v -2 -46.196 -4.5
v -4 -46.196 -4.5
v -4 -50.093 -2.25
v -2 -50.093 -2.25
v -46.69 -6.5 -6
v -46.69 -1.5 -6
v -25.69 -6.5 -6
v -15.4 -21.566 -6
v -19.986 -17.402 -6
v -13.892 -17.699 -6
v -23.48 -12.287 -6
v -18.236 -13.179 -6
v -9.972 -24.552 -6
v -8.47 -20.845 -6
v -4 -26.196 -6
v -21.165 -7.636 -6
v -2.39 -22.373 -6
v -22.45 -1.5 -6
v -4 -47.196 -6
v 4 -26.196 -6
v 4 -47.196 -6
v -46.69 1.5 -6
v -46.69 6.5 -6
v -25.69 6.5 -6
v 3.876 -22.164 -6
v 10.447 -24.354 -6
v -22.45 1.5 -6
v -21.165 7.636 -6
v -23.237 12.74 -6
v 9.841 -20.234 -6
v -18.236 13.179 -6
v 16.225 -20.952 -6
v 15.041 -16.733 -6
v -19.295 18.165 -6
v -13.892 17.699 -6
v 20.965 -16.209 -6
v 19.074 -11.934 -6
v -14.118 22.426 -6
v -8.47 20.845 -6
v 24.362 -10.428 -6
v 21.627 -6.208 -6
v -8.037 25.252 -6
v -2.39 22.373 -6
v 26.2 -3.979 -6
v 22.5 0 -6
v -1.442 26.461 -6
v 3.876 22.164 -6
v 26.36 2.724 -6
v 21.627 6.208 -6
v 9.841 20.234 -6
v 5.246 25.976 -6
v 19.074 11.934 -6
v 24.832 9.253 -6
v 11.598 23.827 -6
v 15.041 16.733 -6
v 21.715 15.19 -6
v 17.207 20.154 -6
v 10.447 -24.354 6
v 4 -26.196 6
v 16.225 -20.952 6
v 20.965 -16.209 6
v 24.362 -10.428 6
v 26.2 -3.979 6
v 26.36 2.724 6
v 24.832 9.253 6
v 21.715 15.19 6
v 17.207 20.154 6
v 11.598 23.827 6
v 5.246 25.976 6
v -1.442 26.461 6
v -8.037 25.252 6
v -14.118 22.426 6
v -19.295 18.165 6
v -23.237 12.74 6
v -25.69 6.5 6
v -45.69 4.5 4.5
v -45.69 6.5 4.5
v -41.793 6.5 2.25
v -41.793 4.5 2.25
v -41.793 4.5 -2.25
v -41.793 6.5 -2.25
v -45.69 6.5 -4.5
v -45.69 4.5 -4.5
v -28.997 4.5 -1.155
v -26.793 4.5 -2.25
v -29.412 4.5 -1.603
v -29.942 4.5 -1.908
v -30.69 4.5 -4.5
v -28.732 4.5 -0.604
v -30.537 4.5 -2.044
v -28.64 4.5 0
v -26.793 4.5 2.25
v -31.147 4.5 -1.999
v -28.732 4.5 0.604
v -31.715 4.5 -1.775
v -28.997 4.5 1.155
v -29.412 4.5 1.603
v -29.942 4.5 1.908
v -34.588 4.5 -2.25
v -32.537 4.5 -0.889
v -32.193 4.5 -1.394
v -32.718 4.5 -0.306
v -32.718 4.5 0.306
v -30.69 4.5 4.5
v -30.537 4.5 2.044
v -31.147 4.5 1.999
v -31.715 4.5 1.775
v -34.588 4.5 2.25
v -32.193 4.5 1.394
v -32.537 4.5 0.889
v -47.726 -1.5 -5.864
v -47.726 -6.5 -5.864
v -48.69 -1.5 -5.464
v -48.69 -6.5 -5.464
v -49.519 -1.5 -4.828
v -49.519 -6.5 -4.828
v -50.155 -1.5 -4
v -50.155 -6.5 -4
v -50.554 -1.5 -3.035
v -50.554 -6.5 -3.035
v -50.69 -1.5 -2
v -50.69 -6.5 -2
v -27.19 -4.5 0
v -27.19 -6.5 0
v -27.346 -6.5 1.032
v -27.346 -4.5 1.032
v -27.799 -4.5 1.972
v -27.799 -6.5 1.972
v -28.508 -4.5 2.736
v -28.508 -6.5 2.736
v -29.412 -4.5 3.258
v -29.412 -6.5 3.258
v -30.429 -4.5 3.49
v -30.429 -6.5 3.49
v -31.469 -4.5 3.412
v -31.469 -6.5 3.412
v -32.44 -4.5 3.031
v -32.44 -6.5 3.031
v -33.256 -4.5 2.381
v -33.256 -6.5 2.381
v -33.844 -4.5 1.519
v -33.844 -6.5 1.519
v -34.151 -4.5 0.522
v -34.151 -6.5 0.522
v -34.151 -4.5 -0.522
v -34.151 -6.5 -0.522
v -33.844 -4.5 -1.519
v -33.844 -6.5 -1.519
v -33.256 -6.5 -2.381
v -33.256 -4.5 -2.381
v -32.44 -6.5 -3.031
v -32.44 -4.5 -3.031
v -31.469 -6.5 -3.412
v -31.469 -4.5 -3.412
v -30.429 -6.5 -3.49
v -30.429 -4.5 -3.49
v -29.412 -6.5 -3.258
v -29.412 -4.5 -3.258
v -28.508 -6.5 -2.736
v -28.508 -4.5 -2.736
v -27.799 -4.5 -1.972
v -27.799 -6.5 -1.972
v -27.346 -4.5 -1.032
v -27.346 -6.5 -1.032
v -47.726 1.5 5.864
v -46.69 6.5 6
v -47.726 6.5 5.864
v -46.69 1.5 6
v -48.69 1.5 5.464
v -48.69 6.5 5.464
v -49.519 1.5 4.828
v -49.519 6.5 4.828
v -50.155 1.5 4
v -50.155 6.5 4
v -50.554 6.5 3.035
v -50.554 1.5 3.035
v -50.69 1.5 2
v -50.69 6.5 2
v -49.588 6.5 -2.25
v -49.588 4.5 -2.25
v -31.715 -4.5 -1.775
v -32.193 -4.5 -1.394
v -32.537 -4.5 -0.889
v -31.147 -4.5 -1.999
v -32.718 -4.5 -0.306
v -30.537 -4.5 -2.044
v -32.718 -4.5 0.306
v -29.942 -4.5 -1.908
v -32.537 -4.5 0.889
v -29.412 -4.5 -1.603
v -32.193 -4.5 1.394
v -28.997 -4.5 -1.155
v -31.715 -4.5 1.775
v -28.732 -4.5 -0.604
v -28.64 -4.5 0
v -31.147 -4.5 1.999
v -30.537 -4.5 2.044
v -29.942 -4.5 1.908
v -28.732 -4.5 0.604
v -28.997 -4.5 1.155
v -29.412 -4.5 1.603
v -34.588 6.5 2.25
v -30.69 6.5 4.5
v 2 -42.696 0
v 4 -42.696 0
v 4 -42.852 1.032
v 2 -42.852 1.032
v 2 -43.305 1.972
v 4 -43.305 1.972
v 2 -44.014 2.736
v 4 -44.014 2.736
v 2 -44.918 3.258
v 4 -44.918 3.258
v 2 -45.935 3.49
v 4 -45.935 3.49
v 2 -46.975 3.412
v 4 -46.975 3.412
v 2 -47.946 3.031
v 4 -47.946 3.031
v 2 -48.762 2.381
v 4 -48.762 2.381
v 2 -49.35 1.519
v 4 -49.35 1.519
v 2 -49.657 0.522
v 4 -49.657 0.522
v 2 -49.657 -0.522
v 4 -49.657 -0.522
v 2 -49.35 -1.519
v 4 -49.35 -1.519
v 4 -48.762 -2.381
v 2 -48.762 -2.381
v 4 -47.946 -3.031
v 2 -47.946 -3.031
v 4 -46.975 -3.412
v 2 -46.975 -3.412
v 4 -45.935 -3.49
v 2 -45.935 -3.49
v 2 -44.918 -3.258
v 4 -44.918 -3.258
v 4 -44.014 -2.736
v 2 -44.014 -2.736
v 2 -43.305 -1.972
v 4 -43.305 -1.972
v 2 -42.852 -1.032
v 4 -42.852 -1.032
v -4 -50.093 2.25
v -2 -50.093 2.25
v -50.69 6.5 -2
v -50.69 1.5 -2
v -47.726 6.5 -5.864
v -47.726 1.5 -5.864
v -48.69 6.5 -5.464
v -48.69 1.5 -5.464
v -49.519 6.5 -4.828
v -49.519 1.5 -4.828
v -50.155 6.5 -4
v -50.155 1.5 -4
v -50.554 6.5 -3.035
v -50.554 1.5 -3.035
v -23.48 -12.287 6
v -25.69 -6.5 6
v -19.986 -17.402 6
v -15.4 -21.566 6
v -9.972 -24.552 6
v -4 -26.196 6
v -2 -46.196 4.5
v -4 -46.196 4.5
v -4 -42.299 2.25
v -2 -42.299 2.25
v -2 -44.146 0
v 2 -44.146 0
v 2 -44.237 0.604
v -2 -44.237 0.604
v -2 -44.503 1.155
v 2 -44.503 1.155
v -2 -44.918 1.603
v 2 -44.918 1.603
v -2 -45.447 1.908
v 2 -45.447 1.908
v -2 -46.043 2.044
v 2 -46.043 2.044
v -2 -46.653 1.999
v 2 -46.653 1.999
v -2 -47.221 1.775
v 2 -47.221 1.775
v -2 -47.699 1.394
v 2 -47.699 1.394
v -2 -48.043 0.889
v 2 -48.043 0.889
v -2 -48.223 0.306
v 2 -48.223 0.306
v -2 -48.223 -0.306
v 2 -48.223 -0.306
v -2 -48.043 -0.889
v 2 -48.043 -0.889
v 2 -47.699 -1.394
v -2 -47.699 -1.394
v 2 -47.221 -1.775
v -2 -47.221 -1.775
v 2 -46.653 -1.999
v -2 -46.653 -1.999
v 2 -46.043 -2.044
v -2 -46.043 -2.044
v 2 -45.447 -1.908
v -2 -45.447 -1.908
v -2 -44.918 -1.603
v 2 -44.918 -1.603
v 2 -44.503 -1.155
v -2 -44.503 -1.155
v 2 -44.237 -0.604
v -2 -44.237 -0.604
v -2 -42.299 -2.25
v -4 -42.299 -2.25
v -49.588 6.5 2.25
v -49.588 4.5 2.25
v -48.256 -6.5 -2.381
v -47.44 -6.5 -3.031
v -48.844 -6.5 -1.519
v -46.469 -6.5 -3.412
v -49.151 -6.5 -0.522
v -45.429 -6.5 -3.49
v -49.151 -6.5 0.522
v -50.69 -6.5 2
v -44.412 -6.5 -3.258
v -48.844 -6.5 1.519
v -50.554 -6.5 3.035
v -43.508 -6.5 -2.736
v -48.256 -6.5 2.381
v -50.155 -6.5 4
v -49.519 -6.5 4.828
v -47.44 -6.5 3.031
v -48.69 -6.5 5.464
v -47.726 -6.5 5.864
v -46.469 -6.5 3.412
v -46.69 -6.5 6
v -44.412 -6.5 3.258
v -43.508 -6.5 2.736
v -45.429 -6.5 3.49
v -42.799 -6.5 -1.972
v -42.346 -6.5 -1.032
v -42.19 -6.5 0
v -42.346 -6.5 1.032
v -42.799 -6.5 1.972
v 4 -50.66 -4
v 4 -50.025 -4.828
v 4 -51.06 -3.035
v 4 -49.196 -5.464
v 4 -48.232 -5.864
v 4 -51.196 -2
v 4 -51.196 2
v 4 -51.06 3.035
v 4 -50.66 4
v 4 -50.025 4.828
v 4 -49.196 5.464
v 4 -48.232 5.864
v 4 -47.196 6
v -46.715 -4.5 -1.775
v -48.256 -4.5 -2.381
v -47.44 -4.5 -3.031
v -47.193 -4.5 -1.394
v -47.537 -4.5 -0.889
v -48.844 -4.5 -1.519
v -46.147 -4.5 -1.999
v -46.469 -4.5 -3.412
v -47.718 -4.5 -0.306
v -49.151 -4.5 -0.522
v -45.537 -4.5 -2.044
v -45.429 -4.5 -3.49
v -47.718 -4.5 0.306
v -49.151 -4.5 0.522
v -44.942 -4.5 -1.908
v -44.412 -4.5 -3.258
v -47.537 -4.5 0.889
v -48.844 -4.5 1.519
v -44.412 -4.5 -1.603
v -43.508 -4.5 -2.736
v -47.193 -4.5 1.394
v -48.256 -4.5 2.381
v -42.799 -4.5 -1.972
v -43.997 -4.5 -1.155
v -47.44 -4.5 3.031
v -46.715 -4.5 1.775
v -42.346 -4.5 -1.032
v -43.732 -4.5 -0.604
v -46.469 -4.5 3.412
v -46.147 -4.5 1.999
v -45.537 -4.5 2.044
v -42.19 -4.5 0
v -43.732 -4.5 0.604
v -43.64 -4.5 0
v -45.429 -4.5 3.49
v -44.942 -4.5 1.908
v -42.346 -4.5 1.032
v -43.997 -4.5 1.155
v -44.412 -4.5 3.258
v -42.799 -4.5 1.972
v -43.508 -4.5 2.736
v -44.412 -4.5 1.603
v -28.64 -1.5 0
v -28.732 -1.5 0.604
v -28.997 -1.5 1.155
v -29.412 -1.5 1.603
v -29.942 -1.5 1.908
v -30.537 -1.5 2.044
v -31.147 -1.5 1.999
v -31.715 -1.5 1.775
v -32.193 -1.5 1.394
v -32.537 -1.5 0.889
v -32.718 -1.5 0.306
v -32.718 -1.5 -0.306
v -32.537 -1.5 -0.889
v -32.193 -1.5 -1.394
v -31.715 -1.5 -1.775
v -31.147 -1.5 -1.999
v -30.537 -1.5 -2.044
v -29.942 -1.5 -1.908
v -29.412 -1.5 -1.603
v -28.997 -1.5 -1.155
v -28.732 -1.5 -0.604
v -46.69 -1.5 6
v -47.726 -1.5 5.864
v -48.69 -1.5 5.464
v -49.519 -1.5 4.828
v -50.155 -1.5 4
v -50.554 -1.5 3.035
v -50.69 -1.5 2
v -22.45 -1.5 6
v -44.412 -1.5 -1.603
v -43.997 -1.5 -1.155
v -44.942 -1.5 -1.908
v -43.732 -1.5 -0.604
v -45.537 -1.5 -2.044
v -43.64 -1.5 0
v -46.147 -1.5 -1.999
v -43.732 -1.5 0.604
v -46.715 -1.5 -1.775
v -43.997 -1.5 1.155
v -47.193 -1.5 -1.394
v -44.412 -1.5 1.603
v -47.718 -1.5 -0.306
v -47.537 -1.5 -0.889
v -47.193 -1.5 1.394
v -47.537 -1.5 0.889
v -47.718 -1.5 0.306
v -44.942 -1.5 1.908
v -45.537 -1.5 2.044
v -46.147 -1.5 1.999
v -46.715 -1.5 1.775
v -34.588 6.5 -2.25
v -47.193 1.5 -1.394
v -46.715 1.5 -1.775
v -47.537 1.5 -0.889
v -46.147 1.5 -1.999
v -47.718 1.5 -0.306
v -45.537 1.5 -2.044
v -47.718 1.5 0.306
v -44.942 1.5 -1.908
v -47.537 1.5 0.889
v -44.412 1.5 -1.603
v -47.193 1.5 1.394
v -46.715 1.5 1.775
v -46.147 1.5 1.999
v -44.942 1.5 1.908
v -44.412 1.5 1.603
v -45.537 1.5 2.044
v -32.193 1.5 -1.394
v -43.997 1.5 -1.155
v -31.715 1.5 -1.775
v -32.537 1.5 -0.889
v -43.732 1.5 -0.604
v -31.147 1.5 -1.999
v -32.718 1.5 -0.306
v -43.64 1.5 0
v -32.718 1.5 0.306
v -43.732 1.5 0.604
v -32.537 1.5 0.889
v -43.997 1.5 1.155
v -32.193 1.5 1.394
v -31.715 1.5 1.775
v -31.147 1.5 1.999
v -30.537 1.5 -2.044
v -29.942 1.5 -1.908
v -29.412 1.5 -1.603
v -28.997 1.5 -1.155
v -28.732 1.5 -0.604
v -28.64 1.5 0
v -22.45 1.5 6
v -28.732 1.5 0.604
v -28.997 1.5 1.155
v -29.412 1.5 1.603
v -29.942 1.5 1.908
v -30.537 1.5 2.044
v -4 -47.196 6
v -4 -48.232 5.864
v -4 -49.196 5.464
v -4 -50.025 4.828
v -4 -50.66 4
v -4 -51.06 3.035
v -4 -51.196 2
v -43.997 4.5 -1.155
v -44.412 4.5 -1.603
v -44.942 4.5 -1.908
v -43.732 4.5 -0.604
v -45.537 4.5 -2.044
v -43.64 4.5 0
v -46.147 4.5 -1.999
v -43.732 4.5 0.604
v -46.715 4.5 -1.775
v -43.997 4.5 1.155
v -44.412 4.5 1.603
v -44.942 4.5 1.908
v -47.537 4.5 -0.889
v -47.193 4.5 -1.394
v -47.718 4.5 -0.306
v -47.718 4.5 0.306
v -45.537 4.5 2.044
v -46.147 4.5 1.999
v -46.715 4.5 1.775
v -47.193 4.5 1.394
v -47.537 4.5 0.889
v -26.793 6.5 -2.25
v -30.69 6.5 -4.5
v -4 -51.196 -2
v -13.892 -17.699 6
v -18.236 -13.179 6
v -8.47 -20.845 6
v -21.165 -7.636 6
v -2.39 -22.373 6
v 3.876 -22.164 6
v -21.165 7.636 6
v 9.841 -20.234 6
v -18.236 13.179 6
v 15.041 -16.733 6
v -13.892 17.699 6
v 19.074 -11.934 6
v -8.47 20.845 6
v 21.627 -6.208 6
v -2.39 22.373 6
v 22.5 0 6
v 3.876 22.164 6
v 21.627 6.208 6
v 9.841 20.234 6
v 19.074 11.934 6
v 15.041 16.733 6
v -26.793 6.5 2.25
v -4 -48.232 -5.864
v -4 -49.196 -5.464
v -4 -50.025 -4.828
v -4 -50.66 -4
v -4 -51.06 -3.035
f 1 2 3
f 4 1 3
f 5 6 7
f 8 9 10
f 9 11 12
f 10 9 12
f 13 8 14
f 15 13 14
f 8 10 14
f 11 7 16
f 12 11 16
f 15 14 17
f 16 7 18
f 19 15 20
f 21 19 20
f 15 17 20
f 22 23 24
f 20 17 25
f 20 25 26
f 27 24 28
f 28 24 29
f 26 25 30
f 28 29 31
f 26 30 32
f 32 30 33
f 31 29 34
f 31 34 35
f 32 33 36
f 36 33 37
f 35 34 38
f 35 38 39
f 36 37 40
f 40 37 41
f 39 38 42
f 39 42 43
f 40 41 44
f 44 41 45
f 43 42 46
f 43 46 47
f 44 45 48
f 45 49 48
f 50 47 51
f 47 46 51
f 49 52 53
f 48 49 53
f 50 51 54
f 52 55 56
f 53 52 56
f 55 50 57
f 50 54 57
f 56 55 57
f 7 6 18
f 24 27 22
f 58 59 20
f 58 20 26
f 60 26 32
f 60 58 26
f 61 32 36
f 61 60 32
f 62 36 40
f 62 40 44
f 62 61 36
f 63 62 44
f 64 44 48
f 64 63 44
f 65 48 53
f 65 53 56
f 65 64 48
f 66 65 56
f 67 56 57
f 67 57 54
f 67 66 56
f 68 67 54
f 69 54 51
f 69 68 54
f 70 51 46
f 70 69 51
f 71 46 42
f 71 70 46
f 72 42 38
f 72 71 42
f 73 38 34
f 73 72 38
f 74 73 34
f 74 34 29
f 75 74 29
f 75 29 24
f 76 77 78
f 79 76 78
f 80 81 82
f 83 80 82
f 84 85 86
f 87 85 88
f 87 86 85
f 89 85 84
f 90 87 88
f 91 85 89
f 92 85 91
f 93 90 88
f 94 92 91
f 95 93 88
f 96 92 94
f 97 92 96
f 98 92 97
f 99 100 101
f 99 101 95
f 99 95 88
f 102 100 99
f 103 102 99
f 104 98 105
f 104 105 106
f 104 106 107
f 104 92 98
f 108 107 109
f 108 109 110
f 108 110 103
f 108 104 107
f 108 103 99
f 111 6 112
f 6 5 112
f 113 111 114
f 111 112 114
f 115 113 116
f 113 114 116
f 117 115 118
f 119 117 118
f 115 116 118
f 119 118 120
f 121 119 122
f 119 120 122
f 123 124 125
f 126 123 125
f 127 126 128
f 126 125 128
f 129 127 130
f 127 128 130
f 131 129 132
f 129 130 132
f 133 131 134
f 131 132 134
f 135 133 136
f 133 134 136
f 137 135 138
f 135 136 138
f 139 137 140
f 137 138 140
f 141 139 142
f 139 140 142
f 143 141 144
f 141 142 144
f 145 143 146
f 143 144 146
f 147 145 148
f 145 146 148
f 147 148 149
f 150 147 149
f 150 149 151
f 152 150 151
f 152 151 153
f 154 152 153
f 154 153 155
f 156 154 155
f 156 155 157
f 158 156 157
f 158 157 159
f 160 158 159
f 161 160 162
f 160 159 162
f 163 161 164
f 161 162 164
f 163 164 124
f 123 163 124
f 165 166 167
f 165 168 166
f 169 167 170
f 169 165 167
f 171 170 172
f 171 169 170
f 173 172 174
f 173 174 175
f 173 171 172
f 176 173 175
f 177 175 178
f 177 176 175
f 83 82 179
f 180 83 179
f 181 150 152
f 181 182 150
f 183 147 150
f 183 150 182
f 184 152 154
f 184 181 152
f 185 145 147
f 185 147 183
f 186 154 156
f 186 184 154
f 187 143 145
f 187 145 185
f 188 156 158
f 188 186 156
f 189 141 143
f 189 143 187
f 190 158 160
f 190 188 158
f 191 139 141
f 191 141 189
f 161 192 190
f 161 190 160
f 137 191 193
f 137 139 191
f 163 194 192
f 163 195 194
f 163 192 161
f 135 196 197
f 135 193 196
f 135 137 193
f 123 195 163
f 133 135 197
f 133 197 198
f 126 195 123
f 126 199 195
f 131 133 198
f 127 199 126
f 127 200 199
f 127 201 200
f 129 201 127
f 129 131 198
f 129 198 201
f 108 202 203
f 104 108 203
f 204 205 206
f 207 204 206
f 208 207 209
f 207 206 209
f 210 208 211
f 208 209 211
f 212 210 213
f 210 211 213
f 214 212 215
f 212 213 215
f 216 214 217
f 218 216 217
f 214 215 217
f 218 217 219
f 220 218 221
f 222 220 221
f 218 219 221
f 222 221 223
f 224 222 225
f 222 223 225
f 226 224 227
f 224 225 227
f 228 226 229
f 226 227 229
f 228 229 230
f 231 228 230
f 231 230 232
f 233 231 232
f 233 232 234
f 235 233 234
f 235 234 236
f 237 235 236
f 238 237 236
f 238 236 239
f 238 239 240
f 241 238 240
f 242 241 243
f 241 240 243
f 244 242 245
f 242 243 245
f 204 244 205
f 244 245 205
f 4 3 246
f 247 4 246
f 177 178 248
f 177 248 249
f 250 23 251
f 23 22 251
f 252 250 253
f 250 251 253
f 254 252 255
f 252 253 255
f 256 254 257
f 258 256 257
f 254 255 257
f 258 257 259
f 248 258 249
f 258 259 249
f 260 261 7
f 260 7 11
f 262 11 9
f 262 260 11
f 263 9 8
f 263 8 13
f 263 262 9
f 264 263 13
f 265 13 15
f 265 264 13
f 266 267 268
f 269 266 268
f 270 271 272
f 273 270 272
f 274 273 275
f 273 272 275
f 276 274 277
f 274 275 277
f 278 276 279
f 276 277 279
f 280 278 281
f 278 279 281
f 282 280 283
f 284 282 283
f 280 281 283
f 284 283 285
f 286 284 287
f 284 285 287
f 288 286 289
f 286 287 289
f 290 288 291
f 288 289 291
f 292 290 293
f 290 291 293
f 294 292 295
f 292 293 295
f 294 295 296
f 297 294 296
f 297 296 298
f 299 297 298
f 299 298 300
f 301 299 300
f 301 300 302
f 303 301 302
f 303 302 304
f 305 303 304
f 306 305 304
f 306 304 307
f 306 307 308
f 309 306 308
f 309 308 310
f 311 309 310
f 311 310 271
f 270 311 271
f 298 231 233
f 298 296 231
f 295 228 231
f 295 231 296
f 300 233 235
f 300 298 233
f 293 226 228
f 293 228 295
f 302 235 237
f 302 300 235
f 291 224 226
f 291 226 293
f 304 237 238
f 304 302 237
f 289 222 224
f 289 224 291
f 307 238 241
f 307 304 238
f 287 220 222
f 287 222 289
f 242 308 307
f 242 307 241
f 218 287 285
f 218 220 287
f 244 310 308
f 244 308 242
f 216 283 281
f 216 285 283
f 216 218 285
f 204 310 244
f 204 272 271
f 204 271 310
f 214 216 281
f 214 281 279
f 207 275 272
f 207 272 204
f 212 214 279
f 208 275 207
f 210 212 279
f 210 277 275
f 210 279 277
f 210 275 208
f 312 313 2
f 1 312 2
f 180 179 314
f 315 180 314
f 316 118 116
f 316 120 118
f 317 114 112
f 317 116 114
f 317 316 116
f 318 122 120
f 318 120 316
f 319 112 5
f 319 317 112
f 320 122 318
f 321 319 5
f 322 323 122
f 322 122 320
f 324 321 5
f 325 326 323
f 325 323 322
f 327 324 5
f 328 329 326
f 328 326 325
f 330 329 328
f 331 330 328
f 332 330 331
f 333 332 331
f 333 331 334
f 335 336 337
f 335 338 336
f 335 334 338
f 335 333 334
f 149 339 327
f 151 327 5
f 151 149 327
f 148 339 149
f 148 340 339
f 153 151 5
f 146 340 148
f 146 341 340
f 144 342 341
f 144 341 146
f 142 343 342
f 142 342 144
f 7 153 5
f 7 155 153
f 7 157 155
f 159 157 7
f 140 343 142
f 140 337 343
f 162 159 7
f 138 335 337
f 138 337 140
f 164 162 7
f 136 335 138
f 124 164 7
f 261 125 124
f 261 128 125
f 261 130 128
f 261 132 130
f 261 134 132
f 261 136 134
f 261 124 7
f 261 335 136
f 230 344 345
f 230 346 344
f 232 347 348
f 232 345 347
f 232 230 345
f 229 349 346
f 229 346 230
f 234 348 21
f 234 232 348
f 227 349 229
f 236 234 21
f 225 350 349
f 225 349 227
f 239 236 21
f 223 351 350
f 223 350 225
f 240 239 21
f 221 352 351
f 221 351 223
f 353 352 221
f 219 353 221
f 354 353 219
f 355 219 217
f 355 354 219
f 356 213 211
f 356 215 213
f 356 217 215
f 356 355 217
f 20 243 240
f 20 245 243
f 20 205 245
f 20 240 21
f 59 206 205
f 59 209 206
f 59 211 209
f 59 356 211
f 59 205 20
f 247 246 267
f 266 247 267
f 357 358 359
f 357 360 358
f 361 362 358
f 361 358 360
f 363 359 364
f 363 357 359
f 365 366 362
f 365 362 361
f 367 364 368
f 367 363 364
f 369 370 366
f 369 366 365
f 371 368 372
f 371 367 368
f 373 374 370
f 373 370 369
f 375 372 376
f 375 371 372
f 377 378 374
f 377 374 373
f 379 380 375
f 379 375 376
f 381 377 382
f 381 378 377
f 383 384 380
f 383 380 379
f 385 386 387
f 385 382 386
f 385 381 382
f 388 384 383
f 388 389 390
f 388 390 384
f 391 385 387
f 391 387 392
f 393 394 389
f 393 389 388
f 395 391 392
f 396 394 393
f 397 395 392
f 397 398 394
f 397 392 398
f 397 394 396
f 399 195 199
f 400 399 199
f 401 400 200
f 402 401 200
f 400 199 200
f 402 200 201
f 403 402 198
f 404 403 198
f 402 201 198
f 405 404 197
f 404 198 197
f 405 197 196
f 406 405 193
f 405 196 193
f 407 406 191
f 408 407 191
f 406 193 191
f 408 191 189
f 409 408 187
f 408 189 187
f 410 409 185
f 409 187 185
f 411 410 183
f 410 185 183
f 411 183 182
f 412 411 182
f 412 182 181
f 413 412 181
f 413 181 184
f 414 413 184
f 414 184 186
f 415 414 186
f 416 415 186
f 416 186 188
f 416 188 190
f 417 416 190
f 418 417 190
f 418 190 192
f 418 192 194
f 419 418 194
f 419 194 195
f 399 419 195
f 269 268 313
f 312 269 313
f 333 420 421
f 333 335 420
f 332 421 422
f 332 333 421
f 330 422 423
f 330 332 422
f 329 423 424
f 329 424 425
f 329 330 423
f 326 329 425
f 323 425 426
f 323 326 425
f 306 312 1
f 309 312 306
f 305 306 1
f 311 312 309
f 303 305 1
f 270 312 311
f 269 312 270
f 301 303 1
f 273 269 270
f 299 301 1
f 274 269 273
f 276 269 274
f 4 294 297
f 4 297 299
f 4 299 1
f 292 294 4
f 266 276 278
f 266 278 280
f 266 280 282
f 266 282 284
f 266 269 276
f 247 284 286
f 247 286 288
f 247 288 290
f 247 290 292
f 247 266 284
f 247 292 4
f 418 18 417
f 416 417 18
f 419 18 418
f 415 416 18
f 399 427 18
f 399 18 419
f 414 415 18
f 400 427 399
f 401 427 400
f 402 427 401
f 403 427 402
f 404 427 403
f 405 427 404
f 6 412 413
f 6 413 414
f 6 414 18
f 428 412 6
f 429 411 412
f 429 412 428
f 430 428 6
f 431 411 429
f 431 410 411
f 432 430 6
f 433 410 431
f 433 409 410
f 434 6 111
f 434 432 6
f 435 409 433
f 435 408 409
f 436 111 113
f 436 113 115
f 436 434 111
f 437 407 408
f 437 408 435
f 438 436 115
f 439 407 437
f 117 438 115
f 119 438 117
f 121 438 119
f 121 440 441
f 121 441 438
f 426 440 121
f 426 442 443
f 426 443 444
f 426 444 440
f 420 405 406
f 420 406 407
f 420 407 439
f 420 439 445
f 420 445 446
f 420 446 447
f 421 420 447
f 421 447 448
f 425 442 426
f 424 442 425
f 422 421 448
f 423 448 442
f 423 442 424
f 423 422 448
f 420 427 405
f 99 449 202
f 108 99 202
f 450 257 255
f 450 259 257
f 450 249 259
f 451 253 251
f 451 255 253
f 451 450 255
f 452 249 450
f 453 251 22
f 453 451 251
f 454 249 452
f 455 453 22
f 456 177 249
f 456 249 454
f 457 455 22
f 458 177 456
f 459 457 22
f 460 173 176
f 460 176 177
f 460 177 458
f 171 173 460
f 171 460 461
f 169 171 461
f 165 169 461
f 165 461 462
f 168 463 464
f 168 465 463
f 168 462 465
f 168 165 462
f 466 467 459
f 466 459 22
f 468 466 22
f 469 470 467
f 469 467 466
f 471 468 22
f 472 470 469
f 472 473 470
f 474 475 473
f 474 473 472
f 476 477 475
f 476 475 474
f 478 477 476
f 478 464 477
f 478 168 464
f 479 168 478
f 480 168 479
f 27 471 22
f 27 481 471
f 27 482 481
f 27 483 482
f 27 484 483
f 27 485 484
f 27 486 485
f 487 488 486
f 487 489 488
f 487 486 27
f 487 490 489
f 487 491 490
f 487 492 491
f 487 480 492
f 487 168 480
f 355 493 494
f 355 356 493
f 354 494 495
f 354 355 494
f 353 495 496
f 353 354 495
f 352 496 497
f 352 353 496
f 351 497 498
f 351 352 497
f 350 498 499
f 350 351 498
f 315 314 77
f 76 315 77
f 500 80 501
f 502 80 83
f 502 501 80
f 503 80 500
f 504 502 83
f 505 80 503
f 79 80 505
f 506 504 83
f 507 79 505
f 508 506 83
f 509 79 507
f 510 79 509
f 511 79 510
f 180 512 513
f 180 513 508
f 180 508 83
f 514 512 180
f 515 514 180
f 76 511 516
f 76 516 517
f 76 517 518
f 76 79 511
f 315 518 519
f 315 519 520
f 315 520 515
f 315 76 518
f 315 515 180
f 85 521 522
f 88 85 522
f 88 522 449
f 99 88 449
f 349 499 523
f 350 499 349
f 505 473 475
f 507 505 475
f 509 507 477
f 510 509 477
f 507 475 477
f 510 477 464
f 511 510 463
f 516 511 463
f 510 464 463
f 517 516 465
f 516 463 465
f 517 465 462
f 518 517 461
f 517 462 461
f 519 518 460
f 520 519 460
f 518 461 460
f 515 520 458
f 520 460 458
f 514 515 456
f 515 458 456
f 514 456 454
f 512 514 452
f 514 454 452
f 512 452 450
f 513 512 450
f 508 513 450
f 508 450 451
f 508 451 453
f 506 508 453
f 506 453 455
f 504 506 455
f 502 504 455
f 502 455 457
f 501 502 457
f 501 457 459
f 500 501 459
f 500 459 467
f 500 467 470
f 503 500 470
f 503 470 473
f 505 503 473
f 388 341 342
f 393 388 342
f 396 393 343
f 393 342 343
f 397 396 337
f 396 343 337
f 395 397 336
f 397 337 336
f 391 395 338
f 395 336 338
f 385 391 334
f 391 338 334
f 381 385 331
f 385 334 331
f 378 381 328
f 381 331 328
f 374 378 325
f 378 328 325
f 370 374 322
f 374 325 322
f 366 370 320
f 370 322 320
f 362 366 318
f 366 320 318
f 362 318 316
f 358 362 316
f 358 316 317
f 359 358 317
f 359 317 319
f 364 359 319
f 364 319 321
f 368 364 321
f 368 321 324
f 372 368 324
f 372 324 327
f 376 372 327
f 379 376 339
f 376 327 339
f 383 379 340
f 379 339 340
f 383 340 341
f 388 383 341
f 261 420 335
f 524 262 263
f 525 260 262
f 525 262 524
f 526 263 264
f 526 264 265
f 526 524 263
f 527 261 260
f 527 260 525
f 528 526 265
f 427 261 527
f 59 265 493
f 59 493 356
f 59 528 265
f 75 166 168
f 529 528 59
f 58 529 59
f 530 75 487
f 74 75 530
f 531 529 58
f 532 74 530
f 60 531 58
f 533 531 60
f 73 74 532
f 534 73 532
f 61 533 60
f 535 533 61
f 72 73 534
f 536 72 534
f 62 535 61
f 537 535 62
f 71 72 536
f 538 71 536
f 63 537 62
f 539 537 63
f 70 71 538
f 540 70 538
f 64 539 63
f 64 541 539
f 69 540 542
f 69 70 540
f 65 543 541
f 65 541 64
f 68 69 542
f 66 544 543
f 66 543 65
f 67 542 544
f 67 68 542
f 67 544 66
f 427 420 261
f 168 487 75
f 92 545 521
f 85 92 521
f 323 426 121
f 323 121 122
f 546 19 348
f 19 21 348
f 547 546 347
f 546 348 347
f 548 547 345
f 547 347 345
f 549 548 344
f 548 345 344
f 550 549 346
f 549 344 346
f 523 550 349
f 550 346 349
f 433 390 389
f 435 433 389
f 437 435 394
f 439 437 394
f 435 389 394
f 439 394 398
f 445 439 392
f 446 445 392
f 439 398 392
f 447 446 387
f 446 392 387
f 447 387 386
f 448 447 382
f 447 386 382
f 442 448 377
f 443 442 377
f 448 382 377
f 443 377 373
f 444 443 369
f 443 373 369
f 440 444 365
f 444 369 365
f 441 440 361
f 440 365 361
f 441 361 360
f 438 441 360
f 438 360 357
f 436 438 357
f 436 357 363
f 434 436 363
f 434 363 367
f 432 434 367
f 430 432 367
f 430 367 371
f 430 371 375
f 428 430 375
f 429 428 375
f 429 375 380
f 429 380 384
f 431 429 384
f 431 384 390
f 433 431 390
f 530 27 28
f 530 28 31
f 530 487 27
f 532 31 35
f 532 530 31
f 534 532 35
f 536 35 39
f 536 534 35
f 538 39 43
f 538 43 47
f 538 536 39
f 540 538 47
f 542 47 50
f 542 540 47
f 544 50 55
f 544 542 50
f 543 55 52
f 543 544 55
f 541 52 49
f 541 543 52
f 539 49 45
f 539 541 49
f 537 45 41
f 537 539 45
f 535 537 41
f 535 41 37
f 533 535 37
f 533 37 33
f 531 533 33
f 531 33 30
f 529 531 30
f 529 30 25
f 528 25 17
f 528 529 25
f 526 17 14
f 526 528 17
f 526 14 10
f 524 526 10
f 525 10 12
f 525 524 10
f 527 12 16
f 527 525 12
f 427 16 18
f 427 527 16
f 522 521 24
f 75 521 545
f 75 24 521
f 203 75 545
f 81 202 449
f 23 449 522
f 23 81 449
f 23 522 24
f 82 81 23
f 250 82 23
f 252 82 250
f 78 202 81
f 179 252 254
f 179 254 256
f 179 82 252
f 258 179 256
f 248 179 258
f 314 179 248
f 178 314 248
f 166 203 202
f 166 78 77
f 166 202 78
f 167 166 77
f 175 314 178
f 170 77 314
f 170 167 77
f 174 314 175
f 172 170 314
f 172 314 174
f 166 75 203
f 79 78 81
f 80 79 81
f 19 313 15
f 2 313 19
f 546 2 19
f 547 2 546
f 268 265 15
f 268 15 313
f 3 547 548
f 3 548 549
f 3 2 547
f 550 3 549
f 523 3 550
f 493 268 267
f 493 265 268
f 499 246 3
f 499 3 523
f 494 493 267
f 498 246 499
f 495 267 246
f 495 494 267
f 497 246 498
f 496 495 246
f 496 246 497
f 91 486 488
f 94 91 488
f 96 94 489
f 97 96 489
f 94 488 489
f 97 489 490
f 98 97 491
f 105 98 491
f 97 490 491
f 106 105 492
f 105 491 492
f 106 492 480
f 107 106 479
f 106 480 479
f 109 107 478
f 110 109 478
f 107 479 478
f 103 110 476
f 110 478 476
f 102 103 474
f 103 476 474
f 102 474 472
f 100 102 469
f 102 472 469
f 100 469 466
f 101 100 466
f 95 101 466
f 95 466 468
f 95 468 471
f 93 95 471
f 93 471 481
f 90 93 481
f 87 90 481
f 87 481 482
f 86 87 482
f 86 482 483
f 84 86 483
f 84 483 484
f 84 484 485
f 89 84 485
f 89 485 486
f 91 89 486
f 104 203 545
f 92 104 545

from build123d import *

# Parameters (mm, degrees)
F1_DEPTH  = 6
F6_DEPTH  = 2
F7_DEPTH  = 2
F2_R      = 2.05
F8_DEPTH  = 13
F2_R_2    = 3.5
F9_DEPTH  = 2
F4_R      = 2.05
F10_DEPTH = 8
F4_R_2    = 3.5
F11_DEPTH = 2
F12_R     = 4


with BuildPart() as f1:
    # F0 (on Top) → F1 (new body, symmetric)
    with BuildSketch(Plane.XY):
        with BuildLine():
            ThreePointArc((-22.449944, 1.5), (22.5, 0), (-22.449944, -1.5))
            Line((-22.449944, -1.5), (-50.690465, -1.5))
            Line((-50.690465, -1.5), (-50.690465, -6.5))
            Line((-50.690465, -6.5), (-25.690465, -6.5))
            ThreePointArc((-25.690465, -6.5), (-17.814817, -19.618417), (-4, -26.196374))
            Line((-4, -26.196374), (-4, -51.196374))
            Line((-4, -51.196374), (4, -51.196374))
            Line((4, -51.196374), (4, -26.196374))
            ThreePointArc((4, -26.196374), (19.618417, 17.814817), (-25.690465, 6.5))
            Line((-25.690465, 6.5), (-50.690465, 6.5))
            Line((-50.690465, 6.5), (-50.690465, 1.5))
            Line((-50.690465, 1.5), (-22.449944, 1.5))
        make_face()
    extrude(amount=F1_DEPTH, both=True)

    # F5 (on face) → F6 (cut)
    with BuildSketch(Plane(origin=(-4, 0, 0), x_dir=(0, -1, 0), z_dir=(-1, 0, 0))):
        Polygon((50.093488, -2.25), (50.093488, 2.25), (46.196374, 4.5), (42.299259, 2.25), (42.299259, -2.25), (46.196374, -4.5), align=None)
    extrude(amount=-F6_DEPTH, mode=Mode.SUBTRACT)

    # F3 (on face) → F7 (cut)
    with BuildSketch(Plane(origin=(0, 6.5, 0), x_dir=(-1, 0, 0), z_dir=(0, 1, 0))):
        Polygon((49.587579, -2.25), (49.587579, 2.25), (45.690465, 4.5), (41.793351, 2.25), (41.793351, -2.25), (45.690465, -4.5), align=None)
        Polygon((34.587579, 2.25), (30.690465, 4.5), (26.793351, 2.25), (26.793351, -2.25), (30.690465, -4.5), (34.587579, -2.25), align=None)
    extrude(amount=-F7_DEPTH, mode=Mode.SUBTRACT)

    # F2 (on face) → F8 (cut, through all)
    with BuildSketch(Plane.XZ.offset(6.5)):
        with Locations((-45.690465, 0)):
            Circle(F2_R)
        with Locations((-30.690465, 0)):
            Circle(F2_R)
    extrude(amount=-F8_DEPTH, mode=Mode.SUBTRACT)

    # F2 (on face) → F9 (cut)
    with BuildSketch(Plane.XZ.offset(6.5)):
        with Locations((-45.690465, 0)):
            Circle(F2_R_2)
        with Locations((-45.690465, 0)):
            Circle(F2_R, mode=Mode.SUBTRACT)
        with Locations((-30.690465, 0)):
            Circle(F2_R_2)
        with Locations((-30.690465, 0)):
            Circle(F2_R, mode=Mode.SUBTRACT)
    extrude(amount=-F9_DEPTH, mode=Mode.SUBTRACT)

    # F4 (on face) → F10 (cut, through all)
    with BuildSketch(Plane.YZ.offset(4)):
        with Locations((-46.196374, 0)):
            Circle(F4_R)
    extrude(amount=-F10_DEPTH, mode=Mode.SUBTRACT)

    # F4 (on face) → F11 (cut)
    with BuildSketch(Plane.YZ.offset(4)):
        with Locations((-46.196374, 0)):
            Circle(F4_R_2)
        with Locations((-46.196374, 0)):
            Circle(F4_R, mode=Mode.SUBTRACT)
    extrude(amount=-F11_DEPTH, mode=Mode.SUBTRACT)

    # F12
    f12_edges = [f1.edges().sort_by_distance(p)[0] for p in [
        (-50.690465, 4, 6),
        (-50.690465, 4, -6),
        (-50.690465, -4, 6),
        (-50.690465, -4, -6),
        (0, -51.196374, 6),
        (0, -51.196374, -6),
    ]]
    fillet(f12_edges, radius=F12_R)


solid = f1.part
